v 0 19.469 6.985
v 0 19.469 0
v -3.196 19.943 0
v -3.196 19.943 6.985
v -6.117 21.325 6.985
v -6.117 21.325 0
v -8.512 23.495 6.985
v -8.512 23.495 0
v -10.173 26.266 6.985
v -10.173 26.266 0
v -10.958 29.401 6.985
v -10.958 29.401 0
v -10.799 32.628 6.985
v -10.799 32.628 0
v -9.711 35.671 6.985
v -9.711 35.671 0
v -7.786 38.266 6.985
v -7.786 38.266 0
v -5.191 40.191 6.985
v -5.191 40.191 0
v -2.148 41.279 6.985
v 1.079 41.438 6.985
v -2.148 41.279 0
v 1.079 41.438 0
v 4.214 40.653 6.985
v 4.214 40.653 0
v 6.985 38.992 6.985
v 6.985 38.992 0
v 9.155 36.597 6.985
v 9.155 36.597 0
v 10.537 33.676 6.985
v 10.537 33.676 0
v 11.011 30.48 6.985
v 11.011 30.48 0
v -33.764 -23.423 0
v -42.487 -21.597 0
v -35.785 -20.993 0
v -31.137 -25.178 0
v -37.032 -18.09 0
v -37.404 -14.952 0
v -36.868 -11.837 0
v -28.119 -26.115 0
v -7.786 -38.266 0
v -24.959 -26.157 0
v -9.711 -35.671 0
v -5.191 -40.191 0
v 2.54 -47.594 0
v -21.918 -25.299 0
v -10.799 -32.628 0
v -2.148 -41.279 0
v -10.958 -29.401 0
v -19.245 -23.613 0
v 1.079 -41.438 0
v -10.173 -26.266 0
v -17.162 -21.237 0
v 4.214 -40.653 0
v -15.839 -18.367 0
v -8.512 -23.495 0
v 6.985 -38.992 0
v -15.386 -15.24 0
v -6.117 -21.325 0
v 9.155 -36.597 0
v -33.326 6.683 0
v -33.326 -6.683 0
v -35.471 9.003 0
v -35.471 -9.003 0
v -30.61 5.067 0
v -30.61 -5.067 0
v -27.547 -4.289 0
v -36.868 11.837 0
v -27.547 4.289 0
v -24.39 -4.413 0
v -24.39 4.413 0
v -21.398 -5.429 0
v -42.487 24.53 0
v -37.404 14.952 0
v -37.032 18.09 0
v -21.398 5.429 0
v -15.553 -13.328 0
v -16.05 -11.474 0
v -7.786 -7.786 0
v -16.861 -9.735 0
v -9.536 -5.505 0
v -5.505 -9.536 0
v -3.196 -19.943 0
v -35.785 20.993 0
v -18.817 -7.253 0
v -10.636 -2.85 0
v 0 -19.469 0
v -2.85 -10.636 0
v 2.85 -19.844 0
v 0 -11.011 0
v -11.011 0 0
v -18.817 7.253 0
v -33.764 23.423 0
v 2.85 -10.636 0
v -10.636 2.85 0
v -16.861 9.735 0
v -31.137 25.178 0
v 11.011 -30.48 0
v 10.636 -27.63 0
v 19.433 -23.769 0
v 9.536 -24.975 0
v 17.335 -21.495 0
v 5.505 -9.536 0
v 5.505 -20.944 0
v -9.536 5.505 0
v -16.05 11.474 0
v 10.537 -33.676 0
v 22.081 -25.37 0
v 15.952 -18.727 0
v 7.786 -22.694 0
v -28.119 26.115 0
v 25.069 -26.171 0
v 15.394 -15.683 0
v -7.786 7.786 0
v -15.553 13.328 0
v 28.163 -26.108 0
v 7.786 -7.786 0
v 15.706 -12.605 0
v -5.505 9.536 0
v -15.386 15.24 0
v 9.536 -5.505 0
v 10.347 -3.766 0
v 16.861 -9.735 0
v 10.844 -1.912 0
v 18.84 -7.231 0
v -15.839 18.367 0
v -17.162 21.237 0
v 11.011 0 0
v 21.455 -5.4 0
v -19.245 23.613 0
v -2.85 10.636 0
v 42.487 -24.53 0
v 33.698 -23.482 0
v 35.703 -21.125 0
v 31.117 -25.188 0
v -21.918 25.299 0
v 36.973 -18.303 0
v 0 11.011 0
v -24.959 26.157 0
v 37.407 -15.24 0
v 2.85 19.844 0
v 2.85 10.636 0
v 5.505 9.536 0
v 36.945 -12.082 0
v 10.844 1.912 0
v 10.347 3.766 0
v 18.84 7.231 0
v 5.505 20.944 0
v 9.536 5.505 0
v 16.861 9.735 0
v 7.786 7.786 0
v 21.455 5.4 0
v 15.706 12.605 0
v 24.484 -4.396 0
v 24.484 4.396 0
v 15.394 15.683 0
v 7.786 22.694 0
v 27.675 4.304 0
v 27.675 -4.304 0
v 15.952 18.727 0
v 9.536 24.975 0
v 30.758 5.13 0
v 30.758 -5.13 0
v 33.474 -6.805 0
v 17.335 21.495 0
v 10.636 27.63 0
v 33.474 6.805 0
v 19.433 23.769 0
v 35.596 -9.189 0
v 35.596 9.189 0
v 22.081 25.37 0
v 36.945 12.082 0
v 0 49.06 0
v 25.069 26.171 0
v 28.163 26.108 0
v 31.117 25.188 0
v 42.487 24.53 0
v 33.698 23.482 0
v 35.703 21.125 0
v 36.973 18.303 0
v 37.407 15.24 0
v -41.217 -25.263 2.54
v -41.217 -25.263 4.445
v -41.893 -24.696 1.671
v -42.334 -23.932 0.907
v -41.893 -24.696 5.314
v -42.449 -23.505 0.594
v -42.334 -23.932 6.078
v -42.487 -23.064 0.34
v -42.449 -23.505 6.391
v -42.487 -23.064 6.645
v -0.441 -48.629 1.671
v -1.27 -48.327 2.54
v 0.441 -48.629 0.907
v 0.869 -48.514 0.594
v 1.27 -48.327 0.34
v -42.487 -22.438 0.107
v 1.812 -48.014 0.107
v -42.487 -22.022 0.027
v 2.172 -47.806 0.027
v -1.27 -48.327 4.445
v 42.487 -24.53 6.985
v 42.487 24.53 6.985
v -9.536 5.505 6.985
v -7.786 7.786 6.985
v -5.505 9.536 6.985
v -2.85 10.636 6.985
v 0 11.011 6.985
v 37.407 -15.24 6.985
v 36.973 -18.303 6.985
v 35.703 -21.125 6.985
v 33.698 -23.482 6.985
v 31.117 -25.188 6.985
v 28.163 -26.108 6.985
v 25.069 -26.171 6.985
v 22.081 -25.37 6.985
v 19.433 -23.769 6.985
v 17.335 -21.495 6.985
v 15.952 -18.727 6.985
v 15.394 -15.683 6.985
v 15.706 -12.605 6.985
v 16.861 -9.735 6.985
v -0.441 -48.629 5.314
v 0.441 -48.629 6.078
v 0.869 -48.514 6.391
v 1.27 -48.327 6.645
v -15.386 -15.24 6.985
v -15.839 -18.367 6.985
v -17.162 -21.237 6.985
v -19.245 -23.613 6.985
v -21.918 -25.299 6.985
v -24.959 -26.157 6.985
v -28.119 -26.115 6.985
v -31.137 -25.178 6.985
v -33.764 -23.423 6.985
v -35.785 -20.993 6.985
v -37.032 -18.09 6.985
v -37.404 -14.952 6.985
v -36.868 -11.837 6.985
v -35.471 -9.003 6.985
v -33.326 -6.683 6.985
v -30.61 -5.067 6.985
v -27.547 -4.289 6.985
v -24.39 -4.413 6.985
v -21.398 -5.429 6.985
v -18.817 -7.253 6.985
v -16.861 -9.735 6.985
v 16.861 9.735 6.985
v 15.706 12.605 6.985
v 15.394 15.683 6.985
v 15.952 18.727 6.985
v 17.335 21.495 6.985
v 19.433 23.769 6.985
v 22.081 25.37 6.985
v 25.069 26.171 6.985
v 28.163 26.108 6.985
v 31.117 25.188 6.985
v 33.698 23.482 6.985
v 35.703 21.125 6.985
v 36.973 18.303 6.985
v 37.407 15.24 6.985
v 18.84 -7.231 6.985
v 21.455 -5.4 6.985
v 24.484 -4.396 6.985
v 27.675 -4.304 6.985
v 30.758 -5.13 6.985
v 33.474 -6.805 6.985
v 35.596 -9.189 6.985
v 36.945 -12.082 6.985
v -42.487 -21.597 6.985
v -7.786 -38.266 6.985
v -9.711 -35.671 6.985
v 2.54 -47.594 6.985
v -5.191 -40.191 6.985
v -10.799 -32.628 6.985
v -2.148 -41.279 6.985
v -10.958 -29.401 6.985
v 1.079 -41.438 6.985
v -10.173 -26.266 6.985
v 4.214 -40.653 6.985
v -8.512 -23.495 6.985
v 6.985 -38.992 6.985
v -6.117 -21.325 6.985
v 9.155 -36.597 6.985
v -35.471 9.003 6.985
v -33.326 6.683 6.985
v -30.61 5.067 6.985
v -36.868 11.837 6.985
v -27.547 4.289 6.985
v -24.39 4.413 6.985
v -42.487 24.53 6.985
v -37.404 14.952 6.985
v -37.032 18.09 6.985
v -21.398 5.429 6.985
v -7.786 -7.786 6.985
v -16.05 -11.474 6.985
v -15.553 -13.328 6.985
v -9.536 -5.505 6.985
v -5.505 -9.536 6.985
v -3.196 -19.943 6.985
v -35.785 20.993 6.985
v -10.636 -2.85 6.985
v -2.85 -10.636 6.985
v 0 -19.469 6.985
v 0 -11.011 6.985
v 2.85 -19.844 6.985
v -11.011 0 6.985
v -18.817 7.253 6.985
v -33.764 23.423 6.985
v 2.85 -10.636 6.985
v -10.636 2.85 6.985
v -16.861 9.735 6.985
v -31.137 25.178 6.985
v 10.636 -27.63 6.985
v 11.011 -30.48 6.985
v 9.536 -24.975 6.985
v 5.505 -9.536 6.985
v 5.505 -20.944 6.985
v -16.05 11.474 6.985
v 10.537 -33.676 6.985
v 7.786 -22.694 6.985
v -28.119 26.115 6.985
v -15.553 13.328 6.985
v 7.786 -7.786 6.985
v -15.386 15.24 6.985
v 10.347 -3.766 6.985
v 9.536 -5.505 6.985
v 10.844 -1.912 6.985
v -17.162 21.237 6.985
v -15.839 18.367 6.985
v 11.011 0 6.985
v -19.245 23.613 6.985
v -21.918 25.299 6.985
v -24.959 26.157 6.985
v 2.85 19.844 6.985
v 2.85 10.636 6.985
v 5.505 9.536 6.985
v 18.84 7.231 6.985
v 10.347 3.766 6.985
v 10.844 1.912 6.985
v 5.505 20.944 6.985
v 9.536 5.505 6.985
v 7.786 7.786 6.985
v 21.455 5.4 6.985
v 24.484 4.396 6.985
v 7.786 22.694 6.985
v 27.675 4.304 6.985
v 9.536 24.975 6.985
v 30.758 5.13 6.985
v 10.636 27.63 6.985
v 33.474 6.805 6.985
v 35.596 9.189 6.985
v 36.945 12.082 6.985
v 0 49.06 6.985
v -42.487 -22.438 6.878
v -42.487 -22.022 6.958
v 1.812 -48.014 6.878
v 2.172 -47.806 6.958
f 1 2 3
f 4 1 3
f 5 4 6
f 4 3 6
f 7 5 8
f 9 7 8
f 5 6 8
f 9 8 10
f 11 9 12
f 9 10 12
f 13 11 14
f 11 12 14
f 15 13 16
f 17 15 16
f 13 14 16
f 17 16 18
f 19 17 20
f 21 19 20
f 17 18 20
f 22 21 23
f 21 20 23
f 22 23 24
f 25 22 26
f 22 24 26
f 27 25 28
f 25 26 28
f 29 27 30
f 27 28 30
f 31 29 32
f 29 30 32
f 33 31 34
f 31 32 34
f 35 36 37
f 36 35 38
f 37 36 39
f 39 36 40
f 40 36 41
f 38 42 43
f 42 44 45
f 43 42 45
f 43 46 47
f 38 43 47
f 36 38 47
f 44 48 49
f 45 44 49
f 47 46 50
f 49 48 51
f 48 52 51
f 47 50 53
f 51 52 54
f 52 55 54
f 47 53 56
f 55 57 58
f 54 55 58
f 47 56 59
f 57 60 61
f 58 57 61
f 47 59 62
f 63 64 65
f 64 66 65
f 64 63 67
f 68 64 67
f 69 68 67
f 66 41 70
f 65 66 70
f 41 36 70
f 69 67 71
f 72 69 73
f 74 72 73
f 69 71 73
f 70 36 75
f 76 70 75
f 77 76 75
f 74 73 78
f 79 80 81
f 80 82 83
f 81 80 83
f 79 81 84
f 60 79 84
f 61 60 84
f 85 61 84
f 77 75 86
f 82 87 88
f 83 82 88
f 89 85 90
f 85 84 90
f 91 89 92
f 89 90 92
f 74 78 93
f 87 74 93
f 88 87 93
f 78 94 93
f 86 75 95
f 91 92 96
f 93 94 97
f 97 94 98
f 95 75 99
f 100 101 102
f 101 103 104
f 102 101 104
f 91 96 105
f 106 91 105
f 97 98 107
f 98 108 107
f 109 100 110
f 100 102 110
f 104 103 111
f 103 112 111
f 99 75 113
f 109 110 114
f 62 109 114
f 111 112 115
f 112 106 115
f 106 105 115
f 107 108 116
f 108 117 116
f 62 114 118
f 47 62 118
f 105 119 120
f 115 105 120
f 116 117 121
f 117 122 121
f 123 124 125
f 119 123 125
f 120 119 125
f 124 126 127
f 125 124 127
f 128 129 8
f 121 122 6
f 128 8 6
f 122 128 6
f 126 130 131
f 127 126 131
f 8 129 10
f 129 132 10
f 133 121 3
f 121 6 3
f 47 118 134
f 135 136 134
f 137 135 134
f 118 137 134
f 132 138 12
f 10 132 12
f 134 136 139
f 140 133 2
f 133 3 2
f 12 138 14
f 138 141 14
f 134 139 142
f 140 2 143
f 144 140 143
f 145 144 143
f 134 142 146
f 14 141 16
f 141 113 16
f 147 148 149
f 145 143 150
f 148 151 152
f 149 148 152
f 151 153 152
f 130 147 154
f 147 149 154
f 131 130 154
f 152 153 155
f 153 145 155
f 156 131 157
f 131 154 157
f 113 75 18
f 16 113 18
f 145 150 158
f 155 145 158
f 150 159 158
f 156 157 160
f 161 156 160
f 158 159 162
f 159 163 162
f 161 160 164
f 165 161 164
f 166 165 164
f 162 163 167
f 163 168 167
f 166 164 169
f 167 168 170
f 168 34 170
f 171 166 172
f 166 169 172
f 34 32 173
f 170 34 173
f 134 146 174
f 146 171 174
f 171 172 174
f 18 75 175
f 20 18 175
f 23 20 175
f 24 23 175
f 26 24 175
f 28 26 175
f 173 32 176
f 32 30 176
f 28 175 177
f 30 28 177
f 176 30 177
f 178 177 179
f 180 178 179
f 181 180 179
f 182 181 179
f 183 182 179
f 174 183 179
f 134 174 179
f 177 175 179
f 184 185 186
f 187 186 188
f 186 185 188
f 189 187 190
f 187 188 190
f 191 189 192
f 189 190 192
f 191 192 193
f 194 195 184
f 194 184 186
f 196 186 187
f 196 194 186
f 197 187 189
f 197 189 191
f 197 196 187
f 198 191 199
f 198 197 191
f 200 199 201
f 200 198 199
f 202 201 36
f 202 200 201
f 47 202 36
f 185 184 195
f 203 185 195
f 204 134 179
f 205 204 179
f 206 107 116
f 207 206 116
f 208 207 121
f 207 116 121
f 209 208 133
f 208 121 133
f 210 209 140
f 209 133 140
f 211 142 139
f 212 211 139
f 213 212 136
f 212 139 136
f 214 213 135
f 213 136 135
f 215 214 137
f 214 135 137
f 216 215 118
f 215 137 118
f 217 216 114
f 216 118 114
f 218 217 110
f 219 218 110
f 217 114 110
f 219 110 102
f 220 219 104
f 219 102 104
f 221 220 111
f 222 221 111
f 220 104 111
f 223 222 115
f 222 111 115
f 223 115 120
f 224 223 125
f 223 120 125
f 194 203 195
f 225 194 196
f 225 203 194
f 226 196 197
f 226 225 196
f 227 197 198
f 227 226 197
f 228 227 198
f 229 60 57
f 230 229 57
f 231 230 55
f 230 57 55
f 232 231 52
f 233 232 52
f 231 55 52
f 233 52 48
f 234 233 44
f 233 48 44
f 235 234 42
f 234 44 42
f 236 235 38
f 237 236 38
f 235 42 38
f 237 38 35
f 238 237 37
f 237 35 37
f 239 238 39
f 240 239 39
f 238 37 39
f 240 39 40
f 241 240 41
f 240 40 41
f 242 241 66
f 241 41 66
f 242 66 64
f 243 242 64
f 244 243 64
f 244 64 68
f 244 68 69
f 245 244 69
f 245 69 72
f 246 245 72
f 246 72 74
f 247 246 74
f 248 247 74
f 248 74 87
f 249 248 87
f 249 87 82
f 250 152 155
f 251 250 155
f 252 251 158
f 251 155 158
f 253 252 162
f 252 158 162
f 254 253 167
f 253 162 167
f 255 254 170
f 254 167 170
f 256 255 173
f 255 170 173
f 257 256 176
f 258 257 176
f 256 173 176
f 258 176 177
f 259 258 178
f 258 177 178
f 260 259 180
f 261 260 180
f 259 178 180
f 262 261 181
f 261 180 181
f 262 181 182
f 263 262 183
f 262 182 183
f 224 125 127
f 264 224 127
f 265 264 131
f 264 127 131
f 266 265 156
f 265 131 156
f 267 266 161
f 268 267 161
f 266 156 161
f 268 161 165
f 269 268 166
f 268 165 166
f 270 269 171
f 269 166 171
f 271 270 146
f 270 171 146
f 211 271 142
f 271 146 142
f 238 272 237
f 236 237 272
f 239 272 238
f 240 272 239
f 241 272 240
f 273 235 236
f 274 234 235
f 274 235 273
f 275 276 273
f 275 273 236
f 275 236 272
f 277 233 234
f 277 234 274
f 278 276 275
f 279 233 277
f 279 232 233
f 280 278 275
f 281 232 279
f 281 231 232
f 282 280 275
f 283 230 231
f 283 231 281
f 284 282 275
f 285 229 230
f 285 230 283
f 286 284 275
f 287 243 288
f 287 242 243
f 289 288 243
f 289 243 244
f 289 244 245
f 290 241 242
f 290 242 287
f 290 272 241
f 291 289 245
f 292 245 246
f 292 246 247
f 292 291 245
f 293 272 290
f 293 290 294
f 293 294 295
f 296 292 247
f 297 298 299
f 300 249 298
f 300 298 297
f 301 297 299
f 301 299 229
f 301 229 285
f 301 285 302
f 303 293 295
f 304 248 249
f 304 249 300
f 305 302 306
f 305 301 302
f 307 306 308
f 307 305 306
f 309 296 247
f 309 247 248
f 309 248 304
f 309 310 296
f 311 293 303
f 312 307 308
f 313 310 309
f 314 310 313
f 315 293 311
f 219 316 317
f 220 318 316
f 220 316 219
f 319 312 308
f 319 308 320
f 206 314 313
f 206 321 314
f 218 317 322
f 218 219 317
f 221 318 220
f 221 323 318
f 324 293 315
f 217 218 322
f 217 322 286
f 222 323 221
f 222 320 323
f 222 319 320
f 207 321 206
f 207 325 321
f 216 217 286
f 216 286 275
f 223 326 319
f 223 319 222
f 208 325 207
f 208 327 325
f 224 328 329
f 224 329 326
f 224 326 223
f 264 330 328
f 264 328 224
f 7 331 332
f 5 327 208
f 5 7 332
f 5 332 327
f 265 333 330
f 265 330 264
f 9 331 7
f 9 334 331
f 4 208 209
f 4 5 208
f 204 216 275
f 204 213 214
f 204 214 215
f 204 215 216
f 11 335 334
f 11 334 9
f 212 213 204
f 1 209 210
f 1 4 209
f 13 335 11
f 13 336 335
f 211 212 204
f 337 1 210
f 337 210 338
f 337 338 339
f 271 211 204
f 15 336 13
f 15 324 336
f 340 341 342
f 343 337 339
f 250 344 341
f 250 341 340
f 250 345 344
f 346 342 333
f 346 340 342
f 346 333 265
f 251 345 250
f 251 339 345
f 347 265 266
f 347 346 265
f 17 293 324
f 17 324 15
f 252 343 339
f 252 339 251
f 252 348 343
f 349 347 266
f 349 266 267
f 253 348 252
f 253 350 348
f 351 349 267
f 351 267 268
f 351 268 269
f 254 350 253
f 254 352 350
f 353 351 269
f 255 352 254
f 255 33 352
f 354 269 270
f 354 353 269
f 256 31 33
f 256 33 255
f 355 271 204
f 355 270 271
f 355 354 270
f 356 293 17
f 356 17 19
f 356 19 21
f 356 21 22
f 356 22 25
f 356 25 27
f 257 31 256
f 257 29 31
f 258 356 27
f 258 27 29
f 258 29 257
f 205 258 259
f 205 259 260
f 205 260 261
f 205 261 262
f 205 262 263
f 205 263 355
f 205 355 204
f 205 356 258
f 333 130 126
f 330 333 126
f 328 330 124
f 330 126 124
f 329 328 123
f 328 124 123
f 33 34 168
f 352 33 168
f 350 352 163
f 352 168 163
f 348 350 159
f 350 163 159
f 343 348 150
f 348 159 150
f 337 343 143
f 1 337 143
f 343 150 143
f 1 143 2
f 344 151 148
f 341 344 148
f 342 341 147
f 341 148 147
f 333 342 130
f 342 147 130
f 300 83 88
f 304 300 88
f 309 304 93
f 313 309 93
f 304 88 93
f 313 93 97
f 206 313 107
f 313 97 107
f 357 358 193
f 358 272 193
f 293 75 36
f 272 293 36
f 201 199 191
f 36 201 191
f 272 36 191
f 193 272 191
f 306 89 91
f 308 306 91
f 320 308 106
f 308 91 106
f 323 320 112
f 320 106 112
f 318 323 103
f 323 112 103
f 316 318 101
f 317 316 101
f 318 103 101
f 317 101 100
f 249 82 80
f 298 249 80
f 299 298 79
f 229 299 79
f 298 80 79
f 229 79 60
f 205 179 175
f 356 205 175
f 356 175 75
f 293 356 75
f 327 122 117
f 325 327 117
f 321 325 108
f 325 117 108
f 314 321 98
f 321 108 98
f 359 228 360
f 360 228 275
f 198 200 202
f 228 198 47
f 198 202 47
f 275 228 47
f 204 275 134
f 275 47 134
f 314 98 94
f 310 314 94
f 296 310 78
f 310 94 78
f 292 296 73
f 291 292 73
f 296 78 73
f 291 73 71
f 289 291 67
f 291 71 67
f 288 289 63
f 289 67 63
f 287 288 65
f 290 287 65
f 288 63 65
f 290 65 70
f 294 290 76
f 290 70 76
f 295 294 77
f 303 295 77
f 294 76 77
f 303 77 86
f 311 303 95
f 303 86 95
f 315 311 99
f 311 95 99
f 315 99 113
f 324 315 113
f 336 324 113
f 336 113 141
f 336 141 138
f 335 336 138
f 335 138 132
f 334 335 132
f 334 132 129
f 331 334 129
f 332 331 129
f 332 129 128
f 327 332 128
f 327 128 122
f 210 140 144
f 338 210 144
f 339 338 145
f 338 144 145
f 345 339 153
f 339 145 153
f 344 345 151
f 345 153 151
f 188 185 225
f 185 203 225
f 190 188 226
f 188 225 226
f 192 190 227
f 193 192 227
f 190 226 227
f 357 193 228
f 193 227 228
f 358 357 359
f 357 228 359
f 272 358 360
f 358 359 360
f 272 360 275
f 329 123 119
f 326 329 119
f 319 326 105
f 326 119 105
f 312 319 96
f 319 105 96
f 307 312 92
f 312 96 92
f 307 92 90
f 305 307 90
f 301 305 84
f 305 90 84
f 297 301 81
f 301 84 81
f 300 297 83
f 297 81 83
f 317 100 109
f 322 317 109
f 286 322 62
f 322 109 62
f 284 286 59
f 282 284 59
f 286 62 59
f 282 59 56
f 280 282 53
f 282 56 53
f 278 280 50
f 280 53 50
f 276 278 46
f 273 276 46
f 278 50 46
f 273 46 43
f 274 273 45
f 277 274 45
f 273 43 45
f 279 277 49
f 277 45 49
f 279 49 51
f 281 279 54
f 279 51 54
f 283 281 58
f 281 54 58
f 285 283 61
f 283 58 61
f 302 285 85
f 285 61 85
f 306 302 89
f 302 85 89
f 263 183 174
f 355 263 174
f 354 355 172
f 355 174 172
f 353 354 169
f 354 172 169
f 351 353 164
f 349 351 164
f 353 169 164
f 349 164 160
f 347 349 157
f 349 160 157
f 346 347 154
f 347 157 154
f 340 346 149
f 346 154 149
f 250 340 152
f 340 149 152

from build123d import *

# Parameters (mm, degrees)
F1_DEPTH = 6.985
F2_R     = 2.54


with BuildPart() as f1:
    # F0 (on Top) → F1 (new body)
    with BuildSketch(Plane.XY):
        with BuildLine():
            ThreePointArc((37.407354, -15.24), (29.246285, -4.604287), (16.860735, -9.73455))
            ThreePointArc((16.860735, -9.73455), (23.546624, -25.875713), (37.407354, -15.24))
        make_face()
        with BuildLine():
            ThreePointArc((11.0109, -30.48), (7.785882, -22.694118), (0, -19.4691))
            ThreePointArc((0, -19.4691), (-7.785882, -38.265882), (11.0109, -30.48))
        make_face()
        with BuildLine():
            ThreePointArc((-15.385554, -15.24), (-15.760742, -12.390169), (-16.860735, -9.73455))
            ThreePointArc((-16.860735, -9.73455), (-37.032167, -18.089831), (-15.385554, -15.24))
        make_face()
        with BuildLine():
            ThreePointArc((-15.385554, 15.24), (-37.032167, 18.089831), (-16.860735, 9.73455))
            ThreePointArc((-16.860735, 9.73455), (-15.760742, 12.390169), (-15.385554, 15.24))
        make_face()
        with BuildLine():
            ThreePointArc((11.0109, 30.48), (-7.785882, 38.265882), (0, 19.4691))
            ThreePointArc((0, 19.4691), (7.785882, 22.694118), (11.0109, 30.48))
        make_face()
        with BuildLine():
            ThreePointArc((37.407354, 15.24), (23.546624, 25.875713), (16.860735, 9.73455))
            ThreePointArc((16.860735, 9.73455), (29.246285, 4.604287), (37.407354, 15.24))
        make_face()
        Polygon((-42.487354, -24.530085), (0, -49.060171), (42.487354, -24.530085), (42.487354, 24.530085), (0, 49.060171), (-42.487354, 24.530085), align=None)
        with BuildLine():
            ThreePointArc((-15.385554, -15.24), (-37.032167, -18.089831), (-16.860735, -9.73455))
            ThreePointArc((-16.860735, -9.73455), (-15.760742, -12.390169), (-15.385554, -15.24))
        make_face(mode=Mode.SUBTRACT)
        with BuildLine():
            ThreePointArc((11.0109, -30.48), (-7.785882, -38.265882), (0, -19.4691))
            ThreePointArc((0, -19.4691), (7.785882, -22.694118), (11.0109, -30.48))
        make_face(mode=Mode.SUBTRACT)
        with BuildLine():
            ThreePointArc((9.535719, 5.50545), (10.635713, 2.849831), (11.0109, 0))
            ThreePointArc((11.0109, 0), (10.635713, -2.849831), (9.535719, -5.50545))
            ThreePointArc((9.535719, -5.50545), (5.50545, -9.535719), (0, -11.0109))
            ThreePointArc((0, -11.0109), (-5.50545, -9.535719), (-9.535719, -5.50545))
            ThreePointArc((-9.535719, -5.50545), (-11.0109, 0), (-9.535719, 5.50545))
            ThreePointArc((-9.535719, 5.50545), (-5.50545, 9.535719), (0, 11.0109))
            ThreePointArc((0, 11.0109), (5.50545, 9.535719), (9.535719, 5.50545))
        make_face(mode=Mode.SUBTRACT)
        with BuildLine():
            ThreePointArc((37.407354, -15.24), (23.546624, -25.875713), (16.860735, -9.73455))
            ThreePointArc((16.860735, -9.73455), (29.246285, -4.604287), (37.407354, -15.24))
        make_face(mode=Mode.SUBTRACT)
        with BuildLine():
            ThreePointArc((-15.385554, 15.24), (-15.760742, 12.390169), (-16.860735, 9.73455))
            ThreePointArc((-16.860735, 9.73455), (-37.032167, 18.089831), (-15.385554, 15.24))
        make_face(mode=Mode.SUBTRACT)
        with BuildLine():
            ThreePointArc((37.407354, 15.24), (29.246285, 4.604287), (16.860735, 9.73455))
            ThreePointArc((16.860735, 9.73455), (23.546624, 25.875713), (37.407354, 15.24))
        make_face(mode=Mode.SUBTRACT)
        with BuildLine():
            ThreePointArc((11.0109, 30.48), (7.785882, 22.694118), (0, 19.4691))
            ThreePointArc((0, 19.4691), (-7.785882, 38.265882), (11.0109, 30.48))
        make_face(mode=Mode.SUBTRACT)
    extrude(amount=F1_DEPTH)

    # F2
    f2_edges = [f1.edges().sort_by_distance(p)[0] for p in [
        (-42.487354, -24.530085, 3.4925),
        (0, -49.060171, 3.4925),
        (-21.243677, -36.795128, 0),
        (-21.243677, -36.795128, 6.985),
    ]]
    fillet(f2_edges, radius=F2_R)


solid = f1.part
